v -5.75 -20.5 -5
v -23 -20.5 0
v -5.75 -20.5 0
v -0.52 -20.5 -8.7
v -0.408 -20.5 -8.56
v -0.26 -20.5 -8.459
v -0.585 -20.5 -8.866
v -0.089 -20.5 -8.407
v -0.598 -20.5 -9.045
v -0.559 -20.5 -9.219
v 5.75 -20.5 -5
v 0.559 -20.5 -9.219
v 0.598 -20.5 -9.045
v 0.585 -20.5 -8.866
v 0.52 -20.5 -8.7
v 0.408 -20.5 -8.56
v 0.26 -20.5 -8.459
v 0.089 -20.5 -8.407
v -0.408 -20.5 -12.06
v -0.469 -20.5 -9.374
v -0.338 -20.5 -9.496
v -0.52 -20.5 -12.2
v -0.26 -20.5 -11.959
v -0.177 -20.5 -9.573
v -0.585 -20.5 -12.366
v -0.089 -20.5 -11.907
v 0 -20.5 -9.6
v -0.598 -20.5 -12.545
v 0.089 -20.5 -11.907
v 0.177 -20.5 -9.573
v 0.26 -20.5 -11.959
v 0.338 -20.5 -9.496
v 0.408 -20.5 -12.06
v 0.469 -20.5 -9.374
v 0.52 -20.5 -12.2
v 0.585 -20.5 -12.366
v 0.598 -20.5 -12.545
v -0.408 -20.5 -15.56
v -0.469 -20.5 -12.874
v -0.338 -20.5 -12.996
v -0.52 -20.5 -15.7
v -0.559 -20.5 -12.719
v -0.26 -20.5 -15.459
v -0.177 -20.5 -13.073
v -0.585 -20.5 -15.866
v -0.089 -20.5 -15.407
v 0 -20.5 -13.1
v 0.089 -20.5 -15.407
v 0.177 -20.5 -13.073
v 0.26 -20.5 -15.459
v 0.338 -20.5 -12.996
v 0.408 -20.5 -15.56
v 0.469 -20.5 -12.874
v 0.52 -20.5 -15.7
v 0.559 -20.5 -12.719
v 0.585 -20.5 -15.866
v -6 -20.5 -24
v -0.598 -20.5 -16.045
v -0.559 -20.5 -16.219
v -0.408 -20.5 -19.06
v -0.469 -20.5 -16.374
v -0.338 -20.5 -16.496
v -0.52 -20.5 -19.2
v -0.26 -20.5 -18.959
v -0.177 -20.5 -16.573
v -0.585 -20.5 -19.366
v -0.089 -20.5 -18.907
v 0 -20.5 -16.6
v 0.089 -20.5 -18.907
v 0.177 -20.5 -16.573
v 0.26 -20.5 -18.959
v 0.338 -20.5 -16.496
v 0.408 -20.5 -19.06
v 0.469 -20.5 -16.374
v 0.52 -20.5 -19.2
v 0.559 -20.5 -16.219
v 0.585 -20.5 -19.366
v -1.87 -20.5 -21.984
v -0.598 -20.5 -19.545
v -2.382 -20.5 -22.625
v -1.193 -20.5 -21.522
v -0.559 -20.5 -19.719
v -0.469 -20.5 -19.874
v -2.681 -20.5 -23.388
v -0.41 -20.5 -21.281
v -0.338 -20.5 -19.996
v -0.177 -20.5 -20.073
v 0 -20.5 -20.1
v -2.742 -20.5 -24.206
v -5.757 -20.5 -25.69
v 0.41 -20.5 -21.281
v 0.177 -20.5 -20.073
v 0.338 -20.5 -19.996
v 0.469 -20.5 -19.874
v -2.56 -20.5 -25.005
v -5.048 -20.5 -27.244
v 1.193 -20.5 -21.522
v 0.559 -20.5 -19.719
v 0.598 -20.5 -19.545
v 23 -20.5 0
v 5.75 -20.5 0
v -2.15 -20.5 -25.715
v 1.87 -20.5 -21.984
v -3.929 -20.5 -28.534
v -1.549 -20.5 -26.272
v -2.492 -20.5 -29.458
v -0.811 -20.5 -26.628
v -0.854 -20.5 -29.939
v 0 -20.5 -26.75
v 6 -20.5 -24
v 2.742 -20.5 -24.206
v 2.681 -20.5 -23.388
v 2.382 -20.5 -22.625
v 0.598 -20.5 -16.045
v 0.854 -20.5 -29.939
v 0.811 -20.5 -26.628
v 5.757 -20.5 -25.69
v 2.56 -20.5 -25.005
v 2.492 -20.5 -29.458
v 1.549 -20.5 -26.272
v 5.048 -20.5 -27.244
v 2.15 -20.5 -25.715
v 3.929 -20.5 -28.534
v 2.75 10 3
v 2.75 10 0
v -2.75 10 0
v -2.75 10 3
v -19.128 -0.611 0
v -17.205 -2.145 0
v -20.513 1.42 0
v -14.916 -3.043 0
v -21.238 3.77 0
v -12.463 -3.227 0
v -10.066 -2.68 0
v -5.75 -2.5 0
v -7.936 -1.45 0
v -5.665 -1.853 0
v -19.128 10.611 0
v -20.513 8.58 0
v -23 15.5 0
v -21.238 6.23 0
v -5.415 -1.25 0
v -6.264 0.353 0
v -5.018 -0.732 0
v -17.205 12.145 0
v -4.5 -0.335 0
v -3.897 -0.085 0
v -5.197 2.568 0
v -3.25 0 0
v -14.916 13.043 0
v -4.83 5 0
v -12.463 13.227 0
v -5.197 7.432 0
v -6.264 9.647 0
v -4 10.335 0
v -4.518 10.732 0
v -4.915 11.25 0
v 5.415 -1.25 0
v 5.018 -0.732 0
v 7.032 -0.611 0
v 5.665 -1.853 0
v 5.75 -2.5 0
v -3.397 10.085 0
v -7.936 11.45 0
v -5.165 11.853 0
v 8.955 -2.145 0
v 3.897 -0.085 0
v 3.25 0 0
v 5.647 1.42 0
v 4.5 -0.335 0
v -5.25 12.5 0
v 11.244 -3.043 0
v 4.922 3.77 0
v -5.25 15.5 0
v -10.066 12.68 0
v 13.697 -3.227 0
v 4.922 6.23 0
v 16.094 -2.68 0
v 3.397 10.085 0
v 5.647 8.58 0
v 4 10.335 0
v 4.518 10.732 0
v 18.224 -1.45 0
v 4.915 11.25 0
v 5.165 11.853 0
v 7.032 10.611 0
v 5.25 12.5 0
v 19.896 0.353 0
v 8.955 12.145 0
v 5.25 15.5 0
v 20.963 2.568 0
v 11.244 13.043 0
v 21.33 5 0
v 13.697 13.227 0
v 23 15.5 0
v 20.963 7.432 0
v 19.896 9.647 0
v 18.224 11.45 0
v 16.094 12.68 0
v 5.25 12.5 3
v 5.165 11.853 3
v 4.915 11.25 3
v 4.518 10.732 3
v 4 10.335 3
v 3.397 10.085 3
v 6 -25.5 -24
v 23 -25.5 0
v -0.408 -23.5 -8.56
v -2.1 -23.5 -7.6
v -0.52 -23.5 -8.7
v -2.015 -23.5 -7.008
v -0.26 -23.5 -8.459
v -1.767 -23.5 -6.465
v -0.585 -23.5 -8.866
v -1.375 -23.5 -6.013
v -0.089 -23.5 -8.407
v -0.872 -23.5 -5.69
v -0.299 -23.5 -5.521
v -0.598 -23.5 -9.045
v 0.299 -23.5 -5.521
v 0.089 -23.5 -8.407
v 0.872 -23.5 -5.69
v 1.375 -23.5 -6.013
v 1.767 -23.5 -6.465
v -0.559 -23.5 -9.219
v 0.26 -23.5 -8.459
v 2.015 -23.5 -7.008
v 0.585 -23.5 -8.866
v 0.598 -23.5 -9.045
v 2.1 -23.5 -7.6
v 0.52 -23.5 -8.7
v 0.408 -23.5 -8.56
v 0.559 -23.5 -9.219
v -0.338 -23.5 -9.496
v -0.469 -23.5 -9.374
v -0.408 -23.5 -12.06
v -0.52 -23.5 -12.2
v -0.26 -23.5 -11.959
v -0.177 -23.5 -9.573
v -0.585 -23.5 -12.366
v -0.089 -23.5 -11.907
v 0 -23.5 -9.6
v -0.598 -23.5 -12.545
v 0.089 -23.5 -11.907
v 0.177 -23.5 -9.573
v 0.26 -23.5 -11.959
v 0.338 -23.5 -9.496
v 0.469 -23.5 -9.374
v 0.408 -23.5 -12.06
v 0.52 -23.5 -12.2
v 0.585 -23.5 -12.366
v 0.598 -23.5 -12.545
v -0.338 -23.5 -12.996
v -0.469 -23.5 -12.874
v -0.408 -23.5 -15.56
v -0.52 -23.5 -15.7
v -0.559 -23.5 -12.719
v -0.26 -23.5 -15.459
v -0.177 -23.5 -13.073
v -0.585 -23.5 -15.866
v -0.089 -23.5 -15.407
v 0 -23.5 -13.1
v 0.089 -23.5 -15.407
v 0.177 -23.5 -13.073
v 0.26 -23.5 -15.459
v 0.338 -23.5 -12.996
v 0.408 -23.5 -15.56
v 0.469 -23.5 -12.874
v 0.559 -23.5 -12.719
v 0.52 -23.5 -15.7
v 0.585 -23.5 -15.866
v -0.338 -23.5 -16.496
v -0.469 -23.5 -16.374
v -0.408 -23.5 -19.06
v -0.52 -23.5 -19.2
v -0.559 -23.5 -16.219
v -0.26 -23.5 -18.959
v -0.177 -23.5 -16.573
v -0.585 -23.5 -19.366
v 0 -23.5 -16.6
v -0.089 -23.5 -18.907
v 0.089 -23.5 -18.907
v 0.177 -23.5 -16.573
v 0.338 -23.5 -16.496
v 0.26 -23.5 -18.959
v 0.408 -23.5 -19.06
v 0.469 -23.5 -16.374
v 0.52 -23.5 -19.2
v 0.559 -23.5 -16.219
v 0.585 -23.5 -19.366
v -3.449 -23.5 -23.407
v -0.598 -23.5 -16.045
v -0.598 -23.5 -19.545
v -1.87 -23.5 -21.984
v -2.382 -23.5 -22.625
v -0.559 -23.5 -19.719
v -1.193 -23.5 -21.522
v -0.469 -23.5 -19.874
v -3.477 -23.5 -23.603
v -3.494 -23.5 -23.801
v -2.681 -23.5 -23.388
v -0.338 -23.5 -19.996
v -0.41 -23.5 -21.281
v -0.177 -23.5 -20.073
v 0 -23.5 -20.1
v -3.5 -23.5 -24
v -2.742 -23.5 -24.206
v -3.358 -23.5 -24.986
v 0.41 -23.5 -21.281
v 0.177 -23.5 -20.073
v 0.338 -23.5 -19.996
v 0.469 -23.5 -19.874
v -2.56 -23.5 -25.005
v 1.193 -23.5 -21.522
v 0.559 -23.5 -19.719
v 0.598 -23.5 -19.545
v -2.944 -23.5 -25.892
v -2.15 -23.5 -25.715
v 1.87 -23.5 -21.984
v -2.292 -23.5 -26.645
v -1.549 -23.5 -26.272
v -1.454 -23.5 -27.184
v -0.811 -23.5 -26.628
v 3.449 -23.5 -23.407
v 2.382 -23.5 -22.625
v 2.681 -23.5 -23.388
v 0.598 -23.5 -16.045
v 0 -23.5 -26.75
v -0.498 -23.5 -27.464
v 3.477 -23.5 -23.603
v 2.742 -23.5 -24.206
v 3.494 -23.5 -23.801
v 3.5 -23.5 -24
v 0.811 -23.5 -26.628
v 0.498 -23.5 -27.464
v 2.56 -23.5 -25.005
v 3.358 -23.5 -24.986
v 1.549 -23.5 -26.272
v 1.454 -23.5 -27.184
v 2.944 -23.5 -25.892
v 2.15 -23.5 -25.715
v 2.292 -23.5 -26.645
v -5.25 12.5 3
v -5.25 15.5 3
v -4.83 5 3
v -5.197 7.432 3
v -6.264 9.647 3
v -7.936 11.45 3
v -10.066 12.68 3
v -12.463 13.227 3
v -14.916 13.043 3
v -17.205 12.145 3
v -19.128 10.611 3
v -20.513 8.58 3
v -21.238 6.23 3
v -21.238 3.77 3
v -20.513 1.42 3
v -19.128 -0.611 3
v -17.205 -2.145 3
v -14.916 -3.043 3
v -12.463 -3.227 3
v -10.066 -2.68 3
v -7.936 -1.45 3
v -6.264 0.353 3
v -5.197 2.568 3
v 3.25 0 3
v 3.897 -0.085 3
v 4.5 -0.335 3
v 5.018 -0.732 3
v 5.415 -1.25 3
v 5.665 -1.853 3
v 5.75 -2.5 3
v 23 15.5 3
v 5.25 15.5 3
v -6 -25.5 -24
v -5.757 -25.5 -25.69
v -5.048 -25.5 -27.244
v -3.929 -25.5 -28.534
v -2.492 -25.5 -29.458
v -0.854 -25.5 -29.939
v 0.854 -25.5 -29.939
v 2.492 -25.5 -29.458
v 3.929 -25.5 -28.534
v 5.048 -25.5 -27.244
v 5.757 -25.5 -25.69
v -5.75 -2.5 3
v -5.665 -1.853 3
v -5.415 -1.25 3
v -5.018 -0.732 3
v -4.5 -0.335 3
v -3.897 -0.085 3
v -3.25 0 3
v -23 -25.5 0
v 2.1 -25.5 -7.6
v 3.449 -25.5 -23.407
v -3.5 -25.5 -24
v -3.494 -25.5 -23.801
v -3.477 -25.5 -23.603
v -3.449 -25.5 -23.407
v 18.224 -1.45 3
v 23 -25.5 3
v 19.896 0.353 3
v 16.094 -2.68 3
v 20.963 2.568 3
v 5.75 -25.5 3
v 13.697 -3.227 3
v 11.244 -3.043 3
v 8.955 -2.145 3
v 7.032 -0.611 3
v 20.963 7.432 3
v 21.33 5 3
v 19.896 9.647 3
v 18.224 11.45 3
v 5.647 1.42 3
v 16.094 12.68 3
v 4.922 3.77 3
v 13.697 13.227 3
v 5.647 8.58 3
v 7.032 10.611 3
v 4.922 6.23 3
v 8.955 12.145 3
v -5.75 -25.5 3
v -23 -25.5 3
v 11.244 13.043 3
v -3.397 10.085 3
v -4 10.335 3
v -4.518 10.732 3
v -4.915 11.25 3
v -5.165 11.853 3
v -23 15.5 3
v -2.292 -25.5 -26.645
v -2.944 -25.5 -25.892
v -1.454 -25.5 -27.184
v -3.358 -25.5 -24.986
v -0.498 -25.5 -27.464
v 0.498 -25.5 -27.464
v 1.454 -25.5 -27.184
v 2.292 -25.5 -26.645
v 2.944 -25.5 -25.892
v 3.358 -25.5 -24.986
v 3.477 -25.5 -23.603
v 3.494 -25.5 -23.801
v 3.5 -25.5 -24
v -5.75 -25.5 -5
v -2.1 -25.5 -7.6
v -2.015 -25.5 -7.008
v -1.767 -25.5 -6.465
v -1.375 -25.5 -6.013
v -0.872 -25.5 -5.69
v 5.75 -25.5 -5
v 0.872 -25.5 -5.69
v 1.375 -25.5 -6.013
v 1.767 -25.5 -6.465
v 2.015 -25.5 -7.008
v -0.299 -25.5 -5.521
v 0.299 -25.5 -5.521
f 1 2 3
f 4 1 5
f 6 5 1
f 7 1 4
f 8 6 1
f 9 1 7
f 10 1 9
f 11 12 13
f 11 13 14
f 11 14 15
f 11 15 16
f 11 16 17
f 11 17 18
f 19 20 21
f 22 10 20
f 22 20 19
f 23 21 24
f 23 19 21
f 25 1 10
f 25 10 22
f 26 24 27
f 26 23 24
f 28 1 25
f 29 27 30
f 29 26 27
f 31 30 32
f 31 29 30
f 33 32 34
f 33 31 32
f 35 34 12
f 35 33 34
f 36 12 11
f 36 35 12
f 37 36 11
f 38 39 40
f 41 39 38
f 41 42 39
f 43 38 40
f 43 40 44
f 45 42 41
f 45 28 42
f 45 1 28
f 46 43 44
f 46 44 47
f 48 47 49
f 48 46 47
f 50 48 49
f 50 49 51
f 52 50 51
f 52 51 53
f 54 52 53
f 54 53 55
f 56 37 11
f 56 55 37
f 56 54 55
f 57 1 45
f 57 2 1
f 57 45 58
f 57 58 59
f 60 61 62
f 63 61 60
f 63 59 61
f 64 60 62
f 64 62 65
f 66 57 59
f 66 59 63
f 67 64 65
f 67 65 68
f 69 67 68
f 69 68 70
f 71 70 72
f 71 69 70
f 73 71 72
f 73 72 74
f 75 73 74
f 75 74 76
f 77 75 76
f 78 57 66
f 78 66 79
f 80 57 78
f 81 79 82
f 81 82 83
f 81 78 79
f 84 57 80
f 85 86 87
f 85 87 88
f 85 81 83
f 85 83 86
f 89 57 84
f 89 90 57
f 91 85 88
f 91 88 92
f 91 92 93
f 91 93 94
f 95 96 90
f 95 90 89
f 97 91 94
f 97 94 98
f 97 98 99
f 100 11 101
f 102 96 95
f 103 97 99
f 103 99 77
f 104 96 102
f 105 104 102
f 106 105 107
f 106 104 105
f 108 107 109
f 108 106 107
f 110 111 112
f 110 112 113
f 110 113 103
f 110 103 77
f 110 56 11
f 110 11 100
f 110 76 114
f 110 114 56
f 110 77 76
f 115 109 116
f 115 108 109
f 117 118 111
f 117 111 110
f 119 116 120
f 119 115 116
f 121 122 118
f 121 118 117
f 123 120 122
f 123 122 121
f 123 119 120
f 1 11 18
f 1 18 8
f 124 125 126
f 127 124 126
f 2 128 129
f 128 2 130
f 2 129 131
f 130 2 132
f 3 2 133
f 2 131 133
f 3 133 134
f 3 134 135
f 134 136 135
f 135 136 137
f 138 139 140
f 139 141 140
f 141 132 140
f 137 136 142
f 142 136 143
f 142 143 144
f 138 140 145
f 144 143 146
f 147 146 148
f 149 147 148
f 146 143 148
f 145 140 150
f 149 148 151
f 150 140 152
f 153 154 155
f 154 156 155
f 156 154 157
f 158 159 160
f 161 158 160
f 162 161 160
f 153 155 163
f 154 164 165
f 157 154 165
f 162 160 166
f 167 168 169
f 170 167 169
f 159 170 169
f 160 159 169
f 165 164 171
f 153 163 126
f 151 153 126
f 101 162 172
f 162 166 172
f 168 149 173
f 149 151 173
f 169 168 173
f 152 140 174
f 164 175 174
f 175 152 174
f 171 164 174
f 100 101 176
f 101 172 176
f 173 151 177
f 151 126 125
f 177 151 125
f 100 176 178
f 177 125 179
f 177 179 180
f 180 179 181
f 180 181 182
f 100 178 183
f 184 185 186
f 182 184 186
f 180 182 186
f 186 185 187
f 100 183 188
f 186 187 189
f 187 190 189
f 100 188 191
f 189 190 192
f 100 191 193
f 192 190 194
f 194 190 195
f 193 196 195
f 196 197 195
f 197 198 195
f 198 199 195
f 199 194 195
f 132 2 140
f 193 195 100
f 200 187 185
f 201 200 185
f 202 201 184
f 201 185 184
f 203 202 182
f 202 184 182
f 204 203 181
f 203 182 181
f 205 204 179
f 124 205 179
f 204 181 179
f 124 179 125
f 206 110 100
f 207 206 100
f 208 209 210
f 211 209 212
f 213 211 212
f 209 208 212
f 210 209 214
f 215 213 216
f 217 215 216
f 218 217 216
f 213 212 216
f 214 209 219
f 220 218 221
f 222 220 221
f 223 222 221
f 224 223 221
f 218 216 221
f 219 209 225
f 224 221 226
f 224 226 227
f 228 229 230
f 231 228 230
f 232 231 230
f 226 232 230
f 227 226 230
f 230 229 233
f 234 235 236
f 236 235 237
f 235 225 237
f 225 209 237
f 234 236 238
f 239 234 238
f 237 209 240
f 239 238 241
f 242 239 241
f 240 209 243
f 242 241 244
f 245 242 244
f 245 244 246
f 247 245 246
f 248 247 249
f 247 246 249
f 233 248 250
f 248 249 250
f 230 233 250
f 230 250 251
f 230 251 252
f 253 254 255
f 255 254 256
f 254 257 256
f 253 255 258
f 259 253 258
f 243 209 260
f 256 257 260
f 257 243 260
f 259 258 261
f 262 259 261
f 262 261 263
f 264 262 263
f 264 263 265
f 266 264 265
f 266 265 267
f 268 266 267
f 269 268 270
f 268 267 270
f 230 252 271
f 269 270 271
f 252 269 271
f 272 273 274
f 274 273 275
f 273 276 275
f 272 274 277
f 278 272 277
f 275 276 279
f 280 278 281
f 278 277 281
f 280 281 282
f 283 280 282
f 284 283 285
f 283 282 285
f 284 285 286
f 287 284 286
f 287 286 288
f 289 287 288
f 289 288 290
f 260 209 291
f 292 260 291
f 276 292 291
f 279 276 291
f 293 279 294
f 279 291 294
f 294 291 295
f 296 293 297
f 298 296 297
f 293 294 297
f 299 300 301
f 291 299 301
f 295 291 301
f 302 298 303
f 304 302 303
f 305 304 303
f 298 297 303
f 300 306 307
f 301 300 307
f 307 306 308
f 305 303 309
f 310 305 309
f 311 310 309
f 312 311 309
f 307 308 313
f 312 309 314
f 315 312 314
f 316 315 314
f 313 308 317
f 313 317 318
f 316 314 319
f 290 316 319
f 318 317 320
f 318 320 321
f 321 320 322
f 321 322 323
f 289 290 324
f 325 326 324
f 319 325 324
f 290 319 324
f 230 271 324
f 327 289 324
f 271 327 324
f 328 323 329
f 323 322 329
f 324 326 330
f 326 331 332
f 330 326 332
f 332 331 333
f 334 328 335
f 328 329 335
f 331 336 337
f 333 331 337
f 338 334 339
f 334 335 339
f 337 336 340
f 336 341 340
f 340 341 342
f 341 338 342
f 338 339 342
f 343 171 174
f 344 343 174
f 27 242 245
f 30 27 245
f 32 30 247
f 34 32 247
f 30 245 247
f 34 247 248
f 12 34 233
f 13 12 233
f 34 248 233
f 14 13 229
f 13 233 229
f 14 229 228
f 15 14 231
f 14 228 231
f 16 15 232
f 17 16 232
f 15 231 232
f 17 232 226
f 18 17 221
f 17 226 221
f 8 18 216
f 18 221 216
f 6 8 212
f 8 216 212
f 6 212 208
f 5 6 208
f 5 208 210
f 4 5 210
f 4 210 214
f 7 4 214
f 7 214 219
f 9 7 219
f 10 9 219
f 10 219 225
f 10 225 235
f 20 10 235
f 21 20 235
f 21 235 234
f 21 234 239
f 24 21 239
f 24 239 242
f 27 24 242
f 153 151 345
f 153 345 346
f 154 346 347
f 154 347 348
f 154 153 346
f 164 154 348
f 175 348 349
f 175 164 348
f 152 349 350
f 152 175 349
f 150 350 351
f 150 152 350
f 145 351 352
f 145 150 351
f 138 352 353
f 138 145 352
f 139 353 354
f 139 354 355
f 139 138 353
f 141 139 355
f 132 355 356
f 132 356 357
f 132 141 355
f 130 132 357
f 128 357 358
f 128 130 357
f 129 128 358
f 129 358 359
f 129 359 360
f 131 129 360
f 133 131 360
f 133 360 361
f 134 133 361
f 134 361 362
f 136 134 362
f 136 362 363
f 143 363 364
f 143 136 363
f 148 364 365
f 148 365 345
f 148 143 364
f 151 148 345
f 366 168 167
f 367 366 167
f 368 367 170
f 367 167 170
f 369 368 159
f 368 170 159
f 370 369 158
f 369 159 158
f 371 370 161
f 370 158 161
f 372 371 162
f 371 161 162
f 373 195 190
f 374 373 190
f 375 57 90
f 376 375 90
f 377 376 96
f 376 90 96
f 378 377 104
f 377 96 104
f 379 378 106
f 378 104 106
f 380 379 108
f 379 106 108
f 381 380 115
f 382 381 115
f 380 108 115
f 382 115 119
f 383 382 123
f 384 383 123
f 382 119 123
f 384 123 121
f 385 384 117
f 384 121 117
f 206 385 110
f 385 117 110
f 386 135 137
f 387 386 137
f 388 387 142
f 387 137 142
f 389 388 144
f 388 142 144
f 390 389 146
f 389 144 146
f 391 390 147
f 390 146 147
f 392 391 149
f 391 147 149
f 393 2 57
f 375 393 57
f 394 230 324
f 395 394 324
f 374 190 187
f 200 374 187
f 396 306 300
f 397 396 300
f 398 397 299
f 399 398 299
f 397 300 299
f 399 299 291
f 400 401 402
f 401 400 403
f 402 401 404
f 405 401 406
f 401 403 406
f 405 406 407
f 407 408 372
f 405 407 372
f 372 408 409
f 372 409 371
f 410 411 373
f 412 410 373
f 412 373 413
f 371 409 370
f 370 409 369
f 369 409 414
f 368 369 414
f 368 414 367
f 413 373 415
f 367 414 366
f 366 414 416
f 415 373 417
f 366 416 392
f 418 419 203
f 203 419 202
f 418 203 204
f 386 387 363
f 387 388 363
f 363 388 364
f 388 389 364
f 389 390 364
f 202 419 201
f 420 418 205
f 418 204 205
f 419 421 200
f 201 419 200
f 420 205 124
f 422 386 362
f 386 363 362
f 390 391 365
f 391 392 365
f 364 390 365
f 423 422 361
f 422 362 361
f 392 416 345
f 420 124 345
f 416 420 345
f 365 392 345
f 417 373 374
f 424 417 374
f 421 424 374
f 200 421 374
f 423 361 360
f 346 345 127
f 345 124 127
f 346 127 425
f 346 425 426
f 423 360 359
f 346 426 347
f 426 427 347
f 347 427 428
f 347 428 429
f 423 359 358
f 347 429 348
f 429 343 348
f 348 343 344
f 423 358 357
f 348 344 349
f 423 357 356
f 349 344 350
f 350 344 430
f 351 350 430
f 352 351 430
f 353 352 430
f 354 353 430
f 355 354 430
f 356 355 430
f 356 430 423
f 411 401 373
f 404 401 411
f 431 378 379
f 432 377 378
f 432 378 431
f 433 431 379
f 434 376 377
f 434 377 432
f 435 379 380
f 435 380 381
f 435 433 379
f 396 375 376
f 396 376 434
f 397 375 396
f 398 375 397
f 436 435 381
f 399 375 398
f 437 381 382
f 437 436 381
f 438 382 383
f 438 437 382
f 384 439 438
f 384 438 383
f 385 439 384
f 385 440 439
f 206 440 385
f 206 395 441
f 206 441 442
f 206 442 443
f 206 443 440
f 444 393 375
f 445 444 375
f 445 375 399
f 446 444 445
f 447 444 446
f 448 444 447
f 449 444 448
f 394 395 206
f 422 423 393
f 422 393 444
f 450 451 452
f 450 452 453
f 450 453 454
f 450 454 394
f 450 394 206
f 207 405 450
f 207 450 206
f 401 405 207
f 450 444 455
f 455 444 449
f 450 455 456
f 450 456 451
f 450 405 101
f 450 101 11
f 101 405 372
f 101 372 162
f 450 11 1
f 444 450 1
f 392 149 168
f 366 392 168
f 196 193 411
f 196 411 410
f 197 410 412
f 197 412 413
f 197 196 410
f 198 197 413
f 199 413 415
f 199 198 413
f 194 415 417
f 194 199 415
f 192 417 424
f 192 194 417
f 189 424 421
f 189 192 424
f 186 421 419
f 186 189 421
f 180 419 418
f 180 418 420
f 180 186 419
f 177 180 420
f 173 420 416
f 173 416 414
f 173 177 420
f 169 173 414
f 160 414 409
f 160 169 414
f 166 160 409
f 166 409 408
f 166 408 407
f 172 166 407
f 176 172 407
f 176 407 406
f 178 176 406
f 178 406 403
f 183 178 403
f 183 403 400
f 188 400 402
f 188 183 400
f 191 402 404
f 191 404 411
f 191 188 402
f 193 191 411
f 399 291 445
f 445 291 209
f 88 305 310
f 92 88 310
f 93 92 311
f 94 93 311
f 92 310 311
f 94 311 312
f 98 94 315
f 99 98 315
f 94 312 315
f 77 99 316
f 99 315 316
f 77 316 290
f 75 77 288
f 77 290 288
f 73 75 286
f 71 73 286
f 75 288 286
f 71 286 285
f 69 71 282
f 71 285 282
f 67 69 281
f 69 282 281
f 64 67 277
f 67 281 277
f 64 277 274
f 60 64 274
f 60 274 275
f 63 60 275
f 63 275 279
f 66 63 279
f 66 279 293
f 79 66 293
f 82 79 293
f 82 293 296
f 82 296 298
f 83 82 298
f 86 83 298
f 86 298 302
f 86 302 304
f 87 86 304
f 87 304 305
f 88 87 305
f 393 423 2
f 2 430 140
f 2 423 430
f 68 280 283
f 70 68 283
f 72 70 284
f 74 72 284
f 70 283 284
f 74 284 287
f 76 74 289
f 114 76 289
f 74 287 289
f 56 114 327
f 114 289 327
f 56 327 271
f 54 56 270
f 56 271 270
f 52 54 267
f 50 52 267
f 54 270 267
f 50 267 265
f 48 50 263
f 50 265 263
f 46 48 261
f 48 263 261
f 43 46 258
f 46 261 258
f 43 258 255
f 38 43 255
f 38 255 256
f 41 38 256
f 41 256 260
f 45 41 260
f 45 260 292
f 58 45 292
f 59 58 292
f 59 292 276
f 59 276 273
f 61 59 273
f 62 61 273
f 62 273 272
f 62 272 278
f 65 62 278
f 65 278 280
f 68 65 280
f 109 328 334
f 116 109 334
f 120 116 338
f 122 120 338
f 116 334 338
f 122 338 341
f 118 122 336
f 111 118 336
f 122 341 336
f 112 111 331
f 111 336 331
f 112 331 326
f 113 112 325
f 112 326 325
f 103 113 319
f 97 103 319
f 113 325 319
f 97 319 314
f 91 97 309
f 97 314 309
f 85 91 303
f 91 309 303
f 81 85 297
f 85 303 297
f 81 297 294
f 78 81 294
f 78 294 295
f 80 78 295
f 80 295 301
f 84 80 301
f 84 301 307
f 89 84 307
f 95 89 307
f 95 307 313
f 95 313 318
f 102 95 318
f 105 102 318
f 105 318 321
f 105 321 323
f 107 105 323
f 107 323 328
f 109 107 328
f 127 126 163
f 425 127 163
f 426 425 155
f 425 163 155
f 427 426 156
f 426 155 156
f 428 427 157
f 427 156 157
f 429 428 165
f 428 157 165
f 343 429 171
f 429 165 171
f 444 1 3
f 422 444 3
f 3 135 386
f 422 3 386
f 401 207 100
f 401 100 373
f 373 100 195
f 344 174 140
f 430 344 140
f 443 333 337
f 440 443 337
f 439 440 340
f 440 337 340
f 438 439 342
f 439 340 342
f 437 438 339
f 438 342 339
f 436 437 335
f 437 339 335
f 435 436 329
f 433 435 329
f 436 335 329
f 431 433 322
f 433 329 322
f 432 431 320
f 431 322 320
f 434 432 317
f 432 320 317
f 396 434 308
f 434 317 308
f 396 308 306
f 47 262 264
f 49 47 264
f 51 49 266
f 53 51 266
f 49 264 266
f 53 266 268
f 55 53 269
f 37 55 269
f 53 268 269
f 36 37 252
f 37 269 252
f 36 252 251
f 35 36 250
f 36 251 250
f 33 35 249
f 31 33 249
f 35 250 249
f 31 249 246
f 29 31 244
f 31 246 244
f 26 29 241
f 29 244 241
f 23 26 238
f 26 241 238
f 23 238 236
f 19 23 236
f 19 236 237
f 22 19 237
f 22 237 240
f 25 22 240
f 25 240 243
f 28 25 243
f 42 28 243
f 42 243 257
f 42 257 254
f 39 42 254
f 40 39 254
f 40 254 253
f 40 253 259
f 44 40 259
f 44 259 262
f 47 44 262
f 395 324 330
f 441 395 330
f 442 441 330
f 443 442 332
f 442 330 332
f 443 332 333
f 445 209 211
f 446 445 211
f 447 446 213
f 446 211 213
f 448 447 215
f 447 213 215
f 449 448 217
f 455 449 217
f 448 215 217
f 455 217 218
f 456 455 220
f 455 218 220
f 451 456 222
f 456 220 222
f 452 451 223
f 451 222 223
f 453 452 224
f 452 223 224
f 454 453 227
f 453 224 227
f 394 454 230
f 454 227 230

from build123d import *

# Parameters (mm, degrees)
SKETCH1_R           = 8.25
BOSS_EXTRUDE1_DEPTH = 3
SKETCH2_W           = 17.25
SKETCH2_H           = 3
BOSS_EXTRUDE2_DEPTH = 5
BOSS_EXTRUDE3_DEPTH = 3
SKETCH4_R           = 2.75
SKETCH4_R_2         = 0.6
CUT_EXTRUDE1_DEPTH  = 55.313902456


with BuildPart() as part:
    # Sketch1 → Boss-Extrude1 (new body)
    # profile 1 of 2: a face of its own
    with BuildSketch(Plane.XY):
        with BuildLine():
            Line((-3.25, 0), (0, 0))
            Line((0, 0), (0, 10))
            Line((0, 10), (-2.75, 10))
            ThreePointArc((-2.75, 10), (-4.517766953, 10.732233047), (-5.25, 12.5))
            Line((-5.25, 12.5), (-5.25, 15.5))
            Line((-5.25, 15.5), (-23, 15.5))
            Line((-23, 15.5), (-23, -20.5))
            Line((-23, -20.5), (-5.75, -20.5))
            Line((-5.75, -20.5), (-5.75, -2.5))
            ThreePointArc((-5.75, -2.5), (-5.017766953, -0.732233047), (-3.25, 0))
        make_face()
        with Locations((-13.08, 5)):
            Circle(SKETCH1_R, mode=Mode.SUBTRACT)
    # profile 2 of 2: a face of its own
    with BuildSketch(Plane.XY):
        with BuildLine():
            Line((0, 10), (0, 0))
            Line((0, 0), (3.25, 0))
            ThreePointArc((3.25, 0), (5.017766953, -0.732233047), (5.75, -2.5))
            Line((5.75, -2.5), (5.75, -20.5))
            Line((5.75, -20.5), (23, -20.5))
            Line((23, -20.5), (23, 15.5))
            Line((23, 15.5), (5.25, 15.5))
            Line((5.25, 15.5), (5.25, 12.5))
            ThreePointArc((5.25, 12.5), (4.517766953, 10.732233047), (2.75, 10))
            Line((2.75, 10), (0, 10))
        make_face()
        with Locations((13.08, 5)):
            Circle(SKETCH1_R, mode=Mode.SUBTRACT)
    extrude(amount=BOSS_EXTRUDE1_DEPTH)

    # Sketch2 → Boss-Extrude2 (add)
    # profile 1 of 2: a face of its own
    with BuildSketch(Plane.XZ.offset(20.5)):
        with BuildLine():
            Line((-23, 3), (-23, 0))
            Line((-23, 0), (-6, -24))
            ThreePointArc((-6, -24), (0, -30), (6, -24))
            Line((6, -24), (23, 0))
            Line((23, 0), (5.75, 0))
            Line((5.75, 0), (5.75, -5))
            Line((5.75, -5), (-5.75, -5))
            Line((-5.75, -5), (-5.75, 3))
            Line((-5.75, 3), (-23, 3))
        make_face()
        with BuildLine():
            Line((-3.449357744, -23.406762144), (-2.1, -7.6))
            ThreePointArc((-2.1, -7.6), (0, -5.5), (2.1, -7.6))
            Line((2.1, -7.6), (3.449357744, -23.406762144))
            ThreePointArc((3.449357744, -23.406762144), (3.487316454, -23.702302254), (3.5, -24))
            ThreePointArc((3.5, -24), (0, -27.5), (-3.5, -24))
            ThreePointArc((-3.5, -24), (-3.487316454, -23.702302254), (-3.449357744, -23.406762144))
        make_face(mode=Mode.SUBTRACT)
    # profile 2 of 2: a face of its own
    with BuildSketch(Plane.XZ.offset(20.5)):
        with Locations((14.375, 1.5)):
            Rectangle(SKETCH2_W, SKETCH2_H)
    extrude(amount=BOSS_EXTRUDE2_DEPTH)

    # Sketch3 → Boss-Extrude3 (add)
    with BuildSketch(Plane(origin=(0, -20.5, 0), x_dir=(1, 0, 0), z_dir=(0, 1, 0))):
        with BuildLine():
            Line((2.1, 7.6), (3.449357744, 23.406762144))
            ThreePointArc((3.449357744, 23.406762144), (0, 27.5), (-3.449357744, 23.406762144))
            Line((-3.449357744, 23.406762144), (-2.1, 7.6))
            ThreePointArc((-2.1, 7.6), (0, 5.5), (2.1, 7.6))
        make_face()
    extrude(amount=-BOSS_EXTRUDE3_DEPTH)

    # Sketch4 → Cut-Extrude1 (cut, through all)
    with BuildSketch(Plane.XZ.offset(23.5)):
        with Locations(Location((0, -24, 0), (0, 0, 270))):
            Circle(SKETCH4_R)
        with Locations(Location((0, -19.5, 0), (0, 0, 270))):
            Circle(SKETCH4_R_2)
        with Locations(Location((0, -16, 0), (0, 0, 270))):
            Circle(SKETCH4_R_2)
        with Locations(Location((0, -12.5, 0), (0, 0, 270))):
            Circle(SKETCH4_R_2)
        with Locations(Location((0, -9, 0), (0, 0, 270))):
            Circle(SKETCH4_R_2)
    extrude(amount=-CUT_EXTRUDE1_DEPTH, mode=Mode.SUBTRACT)


solid = part.part
